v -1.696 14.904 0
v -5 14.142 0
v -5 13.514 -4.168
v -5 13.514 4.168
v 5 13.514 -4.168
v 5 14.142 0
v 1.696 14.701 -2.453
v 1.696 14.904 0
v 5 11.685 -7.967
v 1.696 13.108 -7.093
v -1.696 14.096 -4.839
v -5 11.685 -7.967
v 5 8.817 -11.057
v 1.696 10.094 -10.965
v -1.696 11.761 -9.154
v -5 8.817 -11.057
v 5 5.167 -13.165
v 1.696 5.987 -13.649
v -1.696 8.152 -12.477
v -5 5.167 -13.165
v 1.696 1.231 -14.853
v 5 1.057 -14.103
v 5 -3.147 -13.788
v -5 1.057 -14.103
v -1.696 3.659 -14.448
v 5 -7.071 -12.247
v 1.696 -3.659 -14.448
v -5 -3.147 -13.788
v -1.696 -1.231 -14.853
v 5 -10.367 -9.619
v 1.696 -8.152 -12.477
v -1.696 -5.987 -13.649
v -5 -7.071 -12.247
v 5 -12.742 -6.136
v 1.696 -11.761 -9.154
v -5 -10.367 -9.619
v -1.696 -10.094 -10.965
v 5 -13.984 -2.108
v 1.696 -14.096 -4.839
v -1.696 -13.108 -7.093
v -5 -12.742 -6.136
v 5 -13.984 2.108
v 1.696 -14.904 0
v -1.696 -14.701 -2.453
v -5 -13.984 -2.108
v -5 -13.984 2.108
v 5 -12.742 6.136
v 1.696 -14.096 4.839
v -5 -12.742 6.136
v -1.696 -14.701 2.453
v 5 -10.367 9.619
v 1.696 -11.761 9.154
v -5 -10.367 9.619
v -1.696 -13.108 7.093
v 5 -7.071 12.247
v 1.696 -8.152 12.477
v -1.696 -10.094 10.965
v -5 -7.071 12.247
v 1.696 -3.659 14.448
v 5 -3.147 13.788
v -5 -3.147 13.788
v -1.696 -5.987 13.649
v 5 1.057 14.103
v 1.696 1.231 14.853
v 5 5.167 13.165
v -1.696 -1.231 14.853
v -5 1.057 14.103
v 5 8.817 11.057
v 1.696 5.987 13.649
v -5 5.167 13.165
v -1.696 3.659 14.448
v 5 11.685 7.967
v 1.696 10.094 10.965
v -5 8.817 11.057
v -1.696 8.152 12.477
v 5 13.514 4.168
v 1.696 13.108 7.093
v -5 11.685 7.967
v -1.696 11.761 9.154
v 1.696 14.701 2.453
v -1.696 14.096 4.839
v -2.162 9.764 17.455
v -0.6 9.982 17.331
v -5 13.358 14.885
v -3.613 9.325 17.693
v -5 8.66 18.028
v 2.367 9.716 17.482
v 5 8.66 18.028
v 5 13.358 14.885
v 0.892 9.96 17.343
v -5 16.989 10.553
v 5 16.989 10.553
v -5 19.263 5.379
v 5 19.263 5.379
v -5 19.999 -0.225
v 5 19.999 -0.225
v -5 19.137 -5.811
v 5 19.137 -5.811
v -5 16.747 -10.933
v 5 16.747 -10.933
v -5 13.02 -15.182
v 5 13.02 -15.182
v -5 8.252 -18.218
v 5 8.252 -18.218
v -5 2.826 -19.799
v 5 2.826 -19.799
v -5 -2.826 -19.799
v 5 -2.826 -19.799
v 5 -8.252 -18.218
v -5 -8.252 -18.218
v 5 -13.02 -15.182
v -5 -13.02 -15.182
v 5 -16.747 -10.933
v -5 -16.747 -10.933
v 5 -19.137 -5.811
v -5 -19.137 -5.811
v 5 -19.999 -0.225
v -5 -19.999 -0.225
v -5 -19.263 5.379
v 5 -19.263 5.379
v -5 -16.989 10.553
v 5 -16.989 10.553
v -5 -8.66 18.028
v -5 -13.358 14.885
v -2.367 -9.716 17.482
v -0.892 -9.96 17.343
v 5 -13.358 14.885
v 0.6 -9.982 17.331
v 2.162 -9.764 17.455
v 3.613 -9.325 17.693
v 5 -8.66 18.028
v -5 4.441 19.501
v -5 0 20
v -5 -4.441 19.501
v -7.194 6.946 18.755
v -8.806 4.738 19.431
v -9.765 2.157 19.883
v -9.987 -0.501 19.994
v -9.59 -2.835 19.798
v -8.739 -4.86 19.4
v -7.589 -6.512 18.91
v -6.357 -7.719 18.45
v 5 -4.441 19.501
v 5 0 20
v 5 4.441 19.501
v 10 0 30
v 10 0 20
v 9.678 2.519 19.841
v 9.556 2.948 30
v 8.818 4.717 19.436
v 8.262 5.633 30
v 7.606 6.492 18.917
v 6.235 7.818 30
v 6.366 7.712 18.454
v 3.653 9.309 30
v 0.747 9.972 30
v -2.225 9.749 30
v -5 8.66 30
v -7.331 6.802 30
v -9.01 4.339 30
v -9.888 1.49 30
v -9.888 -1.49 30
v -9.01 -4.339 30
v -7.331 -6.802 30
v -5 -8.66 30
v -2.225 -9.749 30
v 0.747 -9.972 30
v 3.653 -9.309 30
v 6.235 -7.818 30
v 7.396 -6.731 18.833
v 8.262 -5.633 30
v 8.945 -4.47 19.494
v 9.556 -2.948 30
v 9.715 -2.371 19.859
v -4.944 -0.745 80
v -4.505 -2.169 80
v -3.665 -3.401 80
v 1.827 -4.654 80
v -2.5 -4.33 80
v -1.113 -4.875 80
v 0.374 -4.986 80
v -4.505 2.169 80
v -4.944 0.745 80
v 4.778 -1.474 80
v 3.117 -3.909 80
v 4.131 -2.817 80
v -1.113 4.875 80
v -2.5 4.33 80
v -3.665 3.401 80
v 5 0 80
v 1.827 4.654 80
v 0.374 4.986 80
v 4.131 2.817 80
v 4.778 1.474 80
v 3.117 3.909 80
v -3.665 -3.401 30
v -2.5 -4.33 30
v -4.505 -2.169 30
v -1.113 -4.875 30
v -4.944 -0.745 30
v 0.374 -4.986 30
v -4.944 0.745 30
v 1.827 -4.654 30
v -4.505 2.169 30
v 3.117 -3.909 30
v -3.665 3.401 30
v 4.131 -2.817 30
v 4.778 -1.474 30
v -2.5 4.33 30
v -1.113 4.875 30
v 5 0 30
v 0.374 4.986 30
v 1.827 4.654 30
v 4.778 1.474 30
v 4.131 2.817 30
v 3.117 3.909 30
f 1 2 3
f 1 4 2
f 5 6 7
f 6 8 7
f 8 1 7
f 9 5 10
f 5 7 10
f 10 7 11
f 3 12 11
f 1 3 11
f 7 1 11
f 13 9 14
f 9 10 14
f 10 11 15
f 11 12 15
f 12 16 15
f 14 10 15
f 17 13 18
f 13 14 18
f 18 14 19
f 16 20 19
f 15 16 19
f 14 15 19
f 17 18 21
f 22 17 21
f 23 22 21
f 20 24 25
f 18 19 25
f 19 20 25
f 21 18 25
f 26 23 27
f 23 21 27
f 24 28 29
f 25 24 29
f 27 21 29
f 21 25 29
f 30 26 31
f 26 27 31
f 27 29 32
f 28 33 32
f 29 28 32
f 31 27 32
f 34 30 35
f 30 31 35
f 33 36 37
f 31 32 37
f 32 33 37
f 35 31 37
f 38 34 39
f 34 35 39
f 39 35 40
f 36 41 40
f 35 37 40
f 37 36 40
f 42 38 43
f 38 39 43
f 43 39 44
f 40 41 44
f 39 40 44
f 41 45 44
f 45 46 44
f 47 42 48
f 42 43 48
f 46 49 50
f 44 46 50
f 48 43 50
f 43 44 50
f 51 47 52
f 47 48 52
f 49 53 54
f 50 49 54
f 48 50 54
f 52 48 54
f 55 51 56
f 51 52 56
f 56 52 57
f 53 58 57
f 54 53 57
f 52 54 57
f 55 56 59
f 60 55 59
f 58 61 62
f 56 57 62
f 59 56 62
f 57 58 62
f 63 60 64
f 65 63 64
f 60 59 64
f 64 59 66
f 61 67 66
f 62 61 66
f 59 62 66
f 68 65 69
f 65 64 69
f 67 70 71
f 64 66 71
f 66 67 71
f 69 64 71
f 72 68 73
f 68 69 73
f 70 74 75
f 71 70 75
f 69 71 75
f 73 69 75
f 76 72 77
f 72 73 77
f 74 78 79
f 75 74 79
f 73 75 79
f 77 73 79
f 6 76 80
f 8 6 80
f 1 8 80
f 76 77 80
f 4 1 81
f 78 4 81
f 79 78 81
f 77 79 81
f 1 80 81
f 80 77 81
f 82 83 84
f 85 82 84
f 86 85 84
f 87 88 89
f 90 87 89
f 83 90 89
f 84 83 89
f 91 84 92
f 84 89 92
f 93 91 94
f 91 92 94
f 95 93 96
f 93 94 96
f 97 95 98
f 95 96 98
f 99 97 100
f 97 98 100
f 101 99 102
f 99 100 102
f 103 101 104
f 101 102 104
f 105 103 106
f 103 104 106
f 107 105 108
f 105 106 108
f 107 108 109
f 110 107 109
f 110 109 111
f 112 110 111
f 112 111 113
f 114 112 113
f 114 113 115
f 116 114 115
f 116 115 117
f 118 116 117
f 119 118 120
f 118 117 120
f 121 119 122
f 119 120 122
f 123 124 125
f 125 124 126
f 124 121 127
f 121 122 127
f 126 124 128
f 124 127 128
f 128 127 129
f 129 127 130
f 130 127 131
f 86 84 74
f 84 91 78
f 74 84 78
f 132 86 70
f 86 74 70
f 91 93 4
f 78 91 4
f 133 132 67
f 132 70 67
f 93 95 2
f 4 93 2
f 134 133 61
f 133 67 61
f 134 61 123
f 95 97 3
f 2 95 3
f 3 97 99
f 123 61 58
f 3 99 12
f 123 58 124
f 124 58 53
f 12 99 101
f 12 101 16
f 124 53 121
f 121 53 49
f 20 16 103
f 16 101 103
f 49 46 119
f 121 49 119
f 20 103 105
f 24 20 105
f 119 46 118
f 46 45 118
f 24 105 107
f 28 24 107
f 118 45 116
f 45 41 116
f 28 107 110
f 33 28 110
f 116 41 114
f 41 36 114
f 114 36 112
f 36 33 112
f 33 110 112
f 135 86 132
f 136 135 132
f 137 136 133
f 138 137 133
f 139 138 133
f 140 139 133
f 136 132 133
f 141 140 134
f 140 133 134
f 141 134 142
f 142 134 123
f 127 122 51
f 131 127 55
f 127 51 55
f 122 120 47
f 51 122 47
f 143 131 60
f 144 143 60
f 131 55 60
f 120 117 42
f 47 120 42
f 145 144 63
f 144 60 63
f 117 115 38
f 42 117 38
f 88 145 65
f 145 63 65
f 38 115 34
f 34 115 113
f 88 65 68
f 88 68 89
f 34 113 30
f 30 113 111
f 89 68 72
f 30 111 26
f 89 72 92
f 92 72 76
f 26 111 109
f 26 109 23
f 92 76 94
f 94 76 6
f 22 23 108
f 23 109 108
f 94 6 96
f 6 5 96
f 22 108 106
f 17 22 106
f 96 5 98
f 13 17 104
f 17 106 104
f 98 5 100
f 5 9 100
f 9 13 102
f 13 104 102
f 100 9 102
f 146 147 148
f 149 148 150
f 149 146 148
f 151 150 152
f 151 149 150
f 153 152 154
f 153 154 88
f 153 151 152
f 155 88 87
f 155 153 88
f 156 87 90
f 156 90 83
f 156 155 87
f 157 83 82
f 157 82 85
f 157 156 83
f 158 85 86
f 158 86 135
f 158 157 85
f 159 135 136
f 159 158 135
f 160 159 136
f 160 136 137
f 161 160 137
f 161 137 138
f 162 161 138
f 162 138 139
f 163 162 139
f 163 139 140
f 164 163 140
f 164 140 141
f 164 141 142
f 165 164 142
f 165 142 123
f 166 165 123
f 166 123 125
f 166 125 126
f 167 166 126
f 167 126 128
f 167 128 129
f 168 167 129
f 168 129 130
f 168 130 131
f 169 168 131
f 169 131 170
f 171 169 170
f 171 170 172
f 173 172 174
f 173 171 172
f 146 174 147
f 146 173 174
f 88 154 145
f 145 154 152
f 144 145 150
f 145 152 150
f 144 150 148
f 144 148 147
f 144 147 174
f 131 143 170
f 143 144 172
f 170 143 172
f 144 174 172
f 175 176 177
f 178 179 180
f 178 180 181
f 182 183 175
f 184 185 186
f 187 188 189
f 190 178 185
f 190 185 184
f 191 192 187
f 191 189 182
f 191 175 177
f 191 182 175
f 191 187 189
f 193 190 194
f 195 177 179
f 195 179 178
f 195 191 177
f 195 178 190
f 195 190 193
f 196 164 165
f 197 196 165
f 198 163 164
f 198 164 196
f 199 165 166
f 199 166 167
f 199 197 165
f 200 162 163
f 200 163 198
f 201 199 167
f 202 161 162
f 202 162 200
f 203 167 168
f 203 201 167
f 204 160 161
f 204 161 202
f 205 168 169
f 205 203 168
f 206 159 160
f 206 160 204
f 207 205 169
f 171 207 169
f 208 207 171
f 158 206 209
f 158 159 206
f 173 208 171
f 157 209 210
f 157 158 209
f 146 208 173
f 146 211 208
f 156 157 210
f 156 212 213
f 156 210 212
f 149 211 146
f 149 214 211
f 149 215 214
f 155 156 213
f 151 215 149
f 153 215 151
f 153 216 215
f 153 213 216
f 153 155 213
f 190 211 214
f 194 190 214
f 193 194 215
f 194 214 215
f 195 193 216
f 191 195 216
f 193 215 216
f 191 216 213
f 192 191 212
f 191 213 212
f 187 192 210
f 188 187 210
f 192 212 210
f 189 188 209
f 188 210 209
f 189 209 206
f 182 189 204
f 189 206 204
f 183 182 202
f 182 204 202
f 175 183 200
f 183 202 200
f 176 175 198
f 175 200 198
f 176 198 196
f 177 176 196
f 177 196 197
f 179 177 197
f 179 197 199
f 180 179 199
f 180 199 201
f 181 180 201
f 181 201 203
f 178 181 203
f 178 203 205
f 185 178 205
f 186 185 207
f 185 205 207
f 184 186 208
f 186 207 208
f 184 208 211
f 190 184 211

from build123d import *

# Parameters (mm, degrees)
BOSS_EXTRUDE1_REACH      = 56.083
BOSS_EXTRUDE1_END_RADIUS = 20
SKETCH2_R                = 10
SKETCH3_R                = 5
BOSS_EXTRUDE2_DEPTH      = 50


with BuildPart() as part:
    # Sketch1 → Revolve1 (revolve)
    with BuildSketch(Plane.XY):
        with BuildLine():
            Line((-5, 20), (5, 20))
            Line((5, 20), (5, 14.142135624))
            ThreePointArc((5, 14.142135624), (0, 15), (-5, 14.142135624))
            Line((-5, 14.142135624), (-5, 20))
        make_face()
    revolve(axis=Axis((25.861561119, 0, 0), (-1, 0, 0)))

    # Boss-Extrude1: up to this cylinder (the profile starts outside it)
    boss_extrude1_end = Plane(origin=(0, 0, 0), z_dir=(1, 0, 0)) * Cylinder(BOSS_EXTRUDE1_END_RADIUS, 153.166, mode=Mode.PRIVATE)
    # Sketch2 → Boss-Extrude1 (add, up to the surface)
    with BuildSketch(Plane.XY.offset(30), mode=Mode.PRIVATE) as boss_extrude1_sk1:
        Circle(SKETCH2_R)
    boss_extrude1_tool1 = extrude(boss_extrude1_sk1.sketch, amount=-BOSS_EXTRUDE1_REACH, mode=Mode.PRIVATE) - boss_extrude1_end
    add(boss_extrude1_tool1.solids().sort_by_distance((0, 0, 30))[0])

    # Sketch3 → Boss-Extrude2 (add)
    with BuildSketch(Plane.XY.offset(30)):
        Circle(SKETCH3_R)
    extrude(amount=BOSS_EXTRUDE2_DEPTH)


solid = part.part
